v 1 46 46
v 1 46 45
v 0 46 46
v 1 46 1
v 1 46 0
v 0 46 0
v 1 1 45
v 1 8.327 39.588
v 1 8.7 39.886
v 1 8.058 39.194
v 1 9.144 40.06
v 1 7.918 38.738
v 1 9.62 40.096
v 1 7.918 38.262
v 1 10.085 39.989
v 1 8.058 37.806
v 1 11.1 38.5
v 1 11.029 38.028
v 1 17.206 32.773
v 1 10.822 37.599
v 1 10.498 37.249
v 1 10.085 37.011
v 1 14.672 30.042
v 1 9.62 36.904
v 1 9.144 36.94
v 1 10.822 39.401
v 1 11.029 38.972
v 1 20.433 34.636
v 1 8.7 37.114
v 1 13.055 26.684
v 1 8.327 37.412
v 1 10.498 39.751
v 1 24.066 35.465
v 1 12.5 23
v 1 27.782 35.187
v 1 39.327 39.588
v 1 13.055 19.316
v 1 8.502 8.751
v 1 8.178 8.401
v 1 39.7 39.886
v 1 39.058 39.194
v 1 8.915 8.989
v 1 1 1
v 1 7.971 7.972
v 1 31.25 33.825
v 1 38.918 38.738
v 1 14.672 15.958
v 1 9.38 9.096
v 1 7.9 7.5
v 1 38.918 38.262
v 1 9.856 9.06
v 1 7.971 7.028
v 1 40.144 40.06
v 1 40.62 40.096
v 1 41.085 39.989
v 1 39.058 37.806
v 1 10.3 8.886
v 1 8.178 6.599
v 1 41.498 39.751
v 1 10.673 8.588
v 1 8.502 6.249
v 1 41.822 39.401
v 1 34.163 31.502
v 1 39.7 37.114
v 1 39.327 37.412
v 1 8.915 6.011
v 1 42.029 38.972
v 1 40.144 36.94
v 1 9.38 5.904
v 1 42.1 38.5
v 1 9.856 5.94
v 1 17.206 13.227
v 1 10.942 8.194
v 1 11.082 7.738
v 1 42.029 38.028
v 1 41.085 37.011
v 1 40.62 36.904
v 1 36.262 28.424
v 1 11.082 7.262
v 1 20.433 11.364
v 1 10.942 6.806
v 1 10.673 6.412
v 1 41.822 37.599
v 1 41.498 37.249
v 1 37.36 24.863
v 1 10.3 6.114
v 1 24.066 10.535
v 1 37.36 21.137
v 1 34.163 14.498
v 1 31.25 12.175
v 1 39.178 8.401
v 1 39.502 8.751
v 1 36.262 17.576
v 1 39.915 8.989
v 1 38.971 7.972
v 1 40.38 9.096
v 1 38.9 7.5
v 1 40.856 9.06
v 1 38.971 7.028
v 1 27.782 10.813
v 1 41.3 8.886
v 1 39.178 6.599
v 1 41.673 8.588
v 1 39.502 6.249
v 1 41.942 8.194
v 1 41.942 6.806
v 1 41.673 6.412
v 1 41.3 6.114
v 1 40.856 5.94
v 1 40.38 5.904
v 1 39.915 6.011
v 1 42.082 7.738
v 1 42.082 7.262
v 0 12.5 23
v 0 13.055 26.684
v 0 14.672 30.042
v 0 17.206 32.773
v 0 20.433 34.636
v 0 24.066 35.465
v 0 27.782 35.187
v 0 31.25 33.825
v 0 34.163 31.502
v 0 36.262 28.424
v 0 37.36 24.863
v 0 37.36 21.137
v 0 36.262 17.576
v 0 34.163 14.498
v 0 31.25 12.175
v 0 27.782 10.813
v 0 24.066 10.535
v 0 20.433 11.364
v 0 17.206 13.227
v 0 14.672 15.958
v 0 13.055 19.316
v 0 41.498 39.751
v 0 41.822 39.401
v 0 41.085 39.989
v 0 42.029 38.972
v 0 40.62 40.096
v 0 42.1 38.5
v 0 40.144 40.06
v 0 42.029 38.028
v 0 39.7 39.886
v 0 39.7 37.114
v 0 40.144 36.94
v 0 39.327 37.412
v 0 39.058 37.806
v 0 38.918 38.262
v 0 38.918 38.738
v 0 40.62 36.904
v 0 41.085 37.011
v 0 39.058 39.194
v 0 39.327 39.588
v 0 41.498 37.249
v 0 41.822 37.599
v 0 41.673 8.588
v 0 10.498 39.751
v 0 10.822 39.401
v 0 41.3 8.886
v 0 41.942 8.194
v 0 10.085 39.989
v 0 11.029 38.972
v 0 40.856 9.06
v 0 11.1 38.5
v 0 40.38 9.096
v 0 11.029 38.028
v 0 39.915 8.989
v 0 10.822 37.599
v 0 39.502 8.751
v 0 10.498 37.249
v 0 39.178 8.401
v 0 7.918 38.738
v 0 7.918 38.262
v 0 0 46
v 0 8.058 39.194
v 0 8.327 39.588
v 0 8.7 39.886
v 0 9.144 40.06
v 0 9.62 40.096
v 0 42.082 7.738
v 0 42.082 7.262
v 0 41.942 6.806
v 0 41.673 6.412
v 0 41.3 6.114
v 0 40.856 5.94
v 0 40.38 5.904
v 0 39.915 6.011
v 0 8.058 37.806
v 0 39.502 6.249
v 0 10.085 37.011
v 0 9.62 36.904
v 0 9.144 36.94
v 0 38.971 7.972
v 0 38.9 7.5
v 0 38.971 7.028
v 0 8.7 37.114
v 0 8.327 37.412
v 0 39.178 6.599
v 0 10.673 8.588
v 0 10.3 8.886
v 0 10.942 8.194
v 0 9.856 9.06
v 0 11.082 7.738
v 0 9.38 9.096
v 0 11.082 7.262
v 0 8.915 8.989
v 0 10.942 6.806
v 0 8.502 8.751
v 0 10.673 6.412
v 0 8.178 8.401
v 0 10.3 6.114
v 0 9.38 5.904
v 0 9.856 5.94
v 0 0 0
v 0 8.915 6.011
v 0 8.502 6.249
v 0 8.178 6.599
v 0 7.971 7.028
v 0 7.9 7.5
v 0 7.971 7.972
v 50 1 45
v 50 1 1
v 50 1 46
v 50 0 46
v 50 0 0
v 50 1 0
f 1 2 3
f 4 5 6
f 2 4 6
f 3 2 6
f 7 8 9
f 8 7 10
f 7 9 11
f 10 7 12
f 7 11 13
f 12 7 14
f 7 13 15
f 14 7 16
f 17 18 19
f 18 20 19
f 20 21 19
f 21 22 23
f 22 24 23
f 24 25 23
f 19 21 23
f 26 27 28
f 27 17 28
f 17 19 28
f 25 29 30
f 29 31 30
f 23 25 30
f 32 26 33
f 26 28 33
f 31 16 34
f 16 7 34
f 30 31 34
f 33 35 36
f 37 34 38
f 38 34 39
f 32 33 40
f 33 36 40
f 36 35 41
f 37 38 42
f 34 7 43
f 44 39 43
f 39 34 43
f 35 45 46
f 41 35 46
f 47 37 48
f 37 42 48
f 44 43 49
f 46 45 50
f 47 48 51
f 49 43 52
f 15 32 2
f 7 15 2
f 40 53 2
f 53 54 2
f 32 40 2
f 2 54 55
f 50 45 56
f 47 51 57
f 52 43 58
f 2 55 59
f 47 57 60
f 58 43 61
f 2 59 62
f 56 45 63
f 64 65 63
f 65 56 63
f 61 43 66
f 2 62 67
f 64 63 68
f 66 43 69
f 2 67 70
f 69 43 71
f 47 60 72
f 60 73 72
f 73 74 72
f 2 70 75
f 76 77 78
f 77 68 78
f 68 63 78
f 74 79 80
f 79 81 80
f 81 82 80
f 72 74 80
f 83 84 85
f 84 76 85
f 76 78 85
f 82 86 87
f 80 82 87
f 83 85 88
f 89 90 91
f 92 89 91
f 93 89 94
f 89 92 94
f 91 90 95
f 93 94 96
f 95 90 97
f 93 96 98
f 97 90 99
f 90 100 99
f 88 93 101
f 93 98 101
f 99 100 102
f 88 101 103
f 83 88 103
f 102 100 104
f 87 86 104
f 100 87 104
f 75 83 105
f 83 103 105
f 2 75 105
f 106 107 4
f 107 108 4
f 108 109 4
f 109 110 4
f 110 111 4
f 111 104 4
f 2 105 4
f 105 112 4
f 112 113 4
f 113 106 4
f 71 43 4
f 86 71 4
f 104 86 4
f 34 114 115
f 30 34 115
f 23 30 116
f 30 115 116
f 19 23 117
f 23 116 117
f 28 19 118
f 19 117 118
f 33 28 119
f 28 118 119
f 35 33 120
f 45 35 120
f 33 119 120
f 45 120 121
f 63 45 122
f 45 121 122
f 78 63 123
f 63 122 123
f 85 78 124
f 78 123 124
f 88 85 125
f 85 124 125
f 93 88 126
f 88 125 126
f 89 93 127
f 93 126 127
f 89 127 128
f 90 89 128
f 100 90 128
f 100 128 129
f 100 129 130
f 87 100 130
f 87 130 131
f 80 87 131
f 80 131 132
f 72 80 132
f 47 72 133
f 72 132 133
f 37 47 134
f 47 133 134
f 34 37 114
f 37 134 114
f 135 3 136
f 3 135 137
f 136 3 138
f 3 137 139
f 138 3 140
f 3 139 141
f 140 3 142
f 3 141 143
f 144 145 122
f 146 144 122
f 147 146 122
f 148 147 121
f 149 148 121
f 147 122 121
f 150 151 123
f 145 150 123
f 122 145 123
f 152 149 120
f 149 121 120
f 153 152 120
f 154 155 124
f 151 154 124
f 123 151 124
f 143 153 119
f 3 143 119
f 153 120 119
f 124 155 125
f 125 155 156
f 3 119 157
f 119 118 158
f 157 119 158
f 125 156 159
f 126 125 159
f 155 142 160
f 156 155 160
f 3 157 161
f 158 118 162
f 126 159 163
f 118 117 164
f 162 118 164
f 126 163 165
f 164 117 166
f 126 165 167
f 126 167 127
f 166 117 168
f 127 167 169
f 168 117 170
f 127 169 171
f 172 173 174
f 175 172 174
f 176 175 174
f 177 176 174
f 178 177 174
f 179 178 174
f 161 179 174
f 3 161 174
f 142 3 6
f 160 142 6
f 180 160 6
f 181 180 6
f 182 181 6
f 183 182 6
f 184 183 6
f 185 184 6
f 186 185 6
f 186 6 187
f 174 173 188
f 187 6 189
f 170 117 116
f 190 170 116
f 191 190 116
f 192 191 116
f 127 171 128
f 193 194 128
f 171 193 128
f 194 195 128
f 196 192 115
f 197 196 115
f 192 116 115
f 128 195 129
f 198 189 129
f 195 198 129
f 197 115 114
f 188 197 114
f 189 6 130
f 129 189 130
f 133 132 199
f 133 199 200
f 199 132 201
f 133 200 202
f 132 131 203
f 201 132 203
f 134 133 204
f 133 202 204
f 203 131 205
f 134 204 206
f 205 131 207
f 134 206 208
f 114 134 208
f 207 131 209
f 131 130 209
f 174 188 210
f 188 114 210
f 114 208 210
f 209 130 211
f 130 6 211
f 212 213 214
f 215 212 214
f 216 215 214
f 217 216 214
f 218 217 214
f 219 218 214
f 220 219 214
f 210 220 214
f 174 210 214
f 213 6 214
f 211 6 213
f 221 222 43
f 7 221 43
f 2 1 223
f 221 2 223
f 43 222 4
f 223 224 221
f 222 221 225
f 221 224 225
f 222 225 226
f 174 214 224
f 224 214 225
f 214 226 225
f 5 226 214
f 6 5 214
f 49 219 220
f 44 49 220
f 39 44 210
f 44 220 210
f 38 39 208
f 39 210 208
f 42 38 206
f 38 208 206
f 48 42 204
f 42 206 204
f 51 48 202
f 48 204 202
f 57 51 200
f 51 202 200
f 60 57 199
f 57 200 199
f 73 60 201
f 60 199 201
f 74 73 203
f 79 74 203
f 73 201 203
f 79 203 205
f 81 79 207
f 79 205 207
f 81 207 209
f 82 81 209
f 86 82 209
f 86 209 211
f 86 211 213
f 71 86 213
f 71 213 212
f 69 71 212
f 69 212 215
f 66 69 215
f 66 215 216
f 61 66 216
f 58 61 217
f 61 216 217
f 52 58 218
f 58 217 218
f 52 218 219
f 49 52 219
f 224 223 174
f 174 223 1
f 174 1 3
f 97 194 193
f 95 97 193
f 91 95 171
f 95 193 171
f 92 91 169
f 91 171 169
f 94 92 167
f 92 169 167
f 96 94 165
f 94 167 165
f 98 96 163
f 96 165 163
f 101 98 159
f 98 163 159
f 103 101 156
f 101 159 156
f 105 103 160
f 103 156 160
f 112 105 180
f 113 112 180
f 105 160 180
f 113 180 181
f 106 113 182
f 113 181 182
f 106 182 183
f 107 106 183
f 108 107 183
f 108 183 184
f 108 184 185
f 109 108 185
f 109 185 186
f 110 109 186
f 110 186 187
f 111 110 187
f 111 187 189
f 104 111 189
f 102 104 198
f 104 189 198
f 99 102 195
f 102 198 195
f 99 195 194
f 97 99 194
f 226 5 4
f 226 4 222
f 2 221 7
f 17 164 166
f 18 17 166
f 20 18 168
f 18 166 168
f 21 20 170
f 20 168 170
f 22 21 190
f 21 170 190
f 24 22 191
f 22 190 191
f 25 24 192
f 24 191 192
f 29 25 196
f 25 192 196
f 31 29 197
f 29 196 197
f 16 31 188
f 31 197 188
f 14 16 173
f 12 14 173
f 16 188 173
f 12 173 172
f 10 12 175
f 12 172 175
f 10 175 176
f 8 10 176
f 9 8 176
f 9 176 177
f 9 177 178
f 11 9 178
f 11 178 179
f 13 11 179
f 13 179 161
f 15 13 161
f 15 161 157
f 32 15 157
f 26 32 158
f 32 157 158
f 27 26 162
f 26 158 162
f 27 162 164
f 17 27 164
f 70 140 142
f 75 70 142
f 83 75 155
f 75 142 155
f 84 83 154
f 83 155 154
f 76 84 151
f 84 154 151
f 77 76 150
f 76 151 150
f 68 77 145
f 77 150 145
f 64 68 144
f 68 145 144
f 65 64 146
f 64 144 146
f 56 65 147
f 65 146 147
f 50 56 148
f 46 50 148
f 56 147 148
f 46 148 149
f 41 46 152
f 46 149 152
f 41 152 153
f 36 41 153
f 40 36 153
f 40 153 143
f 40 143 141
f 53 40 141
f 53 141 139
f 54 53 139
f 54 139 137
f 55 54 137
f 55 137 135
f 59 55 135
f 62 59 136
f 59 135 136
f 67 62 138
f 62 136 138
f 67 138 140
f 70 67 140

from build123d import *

# Parameters (mm, degrees)
EXTRUDE_1_DEPTH     = 46
EXTRUDE_2_DEPTH     = 1
EXTRUDE_3_DEPTH     = 1
SKETCH_5_R          = 1.6
SKETCH_5_R_2        = 12.5
CUT_EXTRUDE_1_DEPTH = 1


with BuildPart() as part:
    # 草图2 → 凸台-拉伸1 (new body)
    with BuildSketch(Plane.XY):
        Polygon((0, 46), (0, 0), (50, 0), (50, 1), (1, 1), (1, 46), align=None)
    extrude(amount=EXTRUDE_1_DEPTH)

    # 草图3 → 凸台-拉伸2 (add)
    with BuildSketch(Plane.XY.offset(46)):
        Polygon((1, 46), (50, 1), (1, 1), align=None)
    extrude(amount=-EXTRUDE_2_DEPTH)

    # 草图4 → 凸台-拉伸3 (add)
    with BuildSketch(Plane(origin=(0, 0, 0), x_dir=(-1, 0, 0), z_dir=(0, 0, -1))):
        Polygon((-1, 46), (-50, 1), (-1, 1), align=None)
    extrude(amount=-EXTRUDE_3_DEPTH)

    # 草图5 → 切除-拉伸1 (cut)
    with BuildSketch(Plane.ZY):
        with Locations(Location((7.5, 40.5, 0), (0, 0, 270))):
            Circle(SKETCH_5_R)
        with Locations(Location((38.5, 40.5, 0), (0, 0, 90))):
            Circle(SKETCH_5_R)
        with Locations(Location((7.5, 9.5, 0), (0, 0, 270))):
            Circle(SKETCH_5_R)
        with Locations(Location((38.5, 9.5, 0), (0, 0, 90))):
            Circle(SKETCH_5_R)
        with Locations(Location((23, 25, 0), (0, 0, 270))):
            Circle(SKETCH_5_R_2)
    extrude(amount=-CUT_EXTRUDE_1_DEPTH, mode=Mode.SUBTRACT)


solid = part.part
